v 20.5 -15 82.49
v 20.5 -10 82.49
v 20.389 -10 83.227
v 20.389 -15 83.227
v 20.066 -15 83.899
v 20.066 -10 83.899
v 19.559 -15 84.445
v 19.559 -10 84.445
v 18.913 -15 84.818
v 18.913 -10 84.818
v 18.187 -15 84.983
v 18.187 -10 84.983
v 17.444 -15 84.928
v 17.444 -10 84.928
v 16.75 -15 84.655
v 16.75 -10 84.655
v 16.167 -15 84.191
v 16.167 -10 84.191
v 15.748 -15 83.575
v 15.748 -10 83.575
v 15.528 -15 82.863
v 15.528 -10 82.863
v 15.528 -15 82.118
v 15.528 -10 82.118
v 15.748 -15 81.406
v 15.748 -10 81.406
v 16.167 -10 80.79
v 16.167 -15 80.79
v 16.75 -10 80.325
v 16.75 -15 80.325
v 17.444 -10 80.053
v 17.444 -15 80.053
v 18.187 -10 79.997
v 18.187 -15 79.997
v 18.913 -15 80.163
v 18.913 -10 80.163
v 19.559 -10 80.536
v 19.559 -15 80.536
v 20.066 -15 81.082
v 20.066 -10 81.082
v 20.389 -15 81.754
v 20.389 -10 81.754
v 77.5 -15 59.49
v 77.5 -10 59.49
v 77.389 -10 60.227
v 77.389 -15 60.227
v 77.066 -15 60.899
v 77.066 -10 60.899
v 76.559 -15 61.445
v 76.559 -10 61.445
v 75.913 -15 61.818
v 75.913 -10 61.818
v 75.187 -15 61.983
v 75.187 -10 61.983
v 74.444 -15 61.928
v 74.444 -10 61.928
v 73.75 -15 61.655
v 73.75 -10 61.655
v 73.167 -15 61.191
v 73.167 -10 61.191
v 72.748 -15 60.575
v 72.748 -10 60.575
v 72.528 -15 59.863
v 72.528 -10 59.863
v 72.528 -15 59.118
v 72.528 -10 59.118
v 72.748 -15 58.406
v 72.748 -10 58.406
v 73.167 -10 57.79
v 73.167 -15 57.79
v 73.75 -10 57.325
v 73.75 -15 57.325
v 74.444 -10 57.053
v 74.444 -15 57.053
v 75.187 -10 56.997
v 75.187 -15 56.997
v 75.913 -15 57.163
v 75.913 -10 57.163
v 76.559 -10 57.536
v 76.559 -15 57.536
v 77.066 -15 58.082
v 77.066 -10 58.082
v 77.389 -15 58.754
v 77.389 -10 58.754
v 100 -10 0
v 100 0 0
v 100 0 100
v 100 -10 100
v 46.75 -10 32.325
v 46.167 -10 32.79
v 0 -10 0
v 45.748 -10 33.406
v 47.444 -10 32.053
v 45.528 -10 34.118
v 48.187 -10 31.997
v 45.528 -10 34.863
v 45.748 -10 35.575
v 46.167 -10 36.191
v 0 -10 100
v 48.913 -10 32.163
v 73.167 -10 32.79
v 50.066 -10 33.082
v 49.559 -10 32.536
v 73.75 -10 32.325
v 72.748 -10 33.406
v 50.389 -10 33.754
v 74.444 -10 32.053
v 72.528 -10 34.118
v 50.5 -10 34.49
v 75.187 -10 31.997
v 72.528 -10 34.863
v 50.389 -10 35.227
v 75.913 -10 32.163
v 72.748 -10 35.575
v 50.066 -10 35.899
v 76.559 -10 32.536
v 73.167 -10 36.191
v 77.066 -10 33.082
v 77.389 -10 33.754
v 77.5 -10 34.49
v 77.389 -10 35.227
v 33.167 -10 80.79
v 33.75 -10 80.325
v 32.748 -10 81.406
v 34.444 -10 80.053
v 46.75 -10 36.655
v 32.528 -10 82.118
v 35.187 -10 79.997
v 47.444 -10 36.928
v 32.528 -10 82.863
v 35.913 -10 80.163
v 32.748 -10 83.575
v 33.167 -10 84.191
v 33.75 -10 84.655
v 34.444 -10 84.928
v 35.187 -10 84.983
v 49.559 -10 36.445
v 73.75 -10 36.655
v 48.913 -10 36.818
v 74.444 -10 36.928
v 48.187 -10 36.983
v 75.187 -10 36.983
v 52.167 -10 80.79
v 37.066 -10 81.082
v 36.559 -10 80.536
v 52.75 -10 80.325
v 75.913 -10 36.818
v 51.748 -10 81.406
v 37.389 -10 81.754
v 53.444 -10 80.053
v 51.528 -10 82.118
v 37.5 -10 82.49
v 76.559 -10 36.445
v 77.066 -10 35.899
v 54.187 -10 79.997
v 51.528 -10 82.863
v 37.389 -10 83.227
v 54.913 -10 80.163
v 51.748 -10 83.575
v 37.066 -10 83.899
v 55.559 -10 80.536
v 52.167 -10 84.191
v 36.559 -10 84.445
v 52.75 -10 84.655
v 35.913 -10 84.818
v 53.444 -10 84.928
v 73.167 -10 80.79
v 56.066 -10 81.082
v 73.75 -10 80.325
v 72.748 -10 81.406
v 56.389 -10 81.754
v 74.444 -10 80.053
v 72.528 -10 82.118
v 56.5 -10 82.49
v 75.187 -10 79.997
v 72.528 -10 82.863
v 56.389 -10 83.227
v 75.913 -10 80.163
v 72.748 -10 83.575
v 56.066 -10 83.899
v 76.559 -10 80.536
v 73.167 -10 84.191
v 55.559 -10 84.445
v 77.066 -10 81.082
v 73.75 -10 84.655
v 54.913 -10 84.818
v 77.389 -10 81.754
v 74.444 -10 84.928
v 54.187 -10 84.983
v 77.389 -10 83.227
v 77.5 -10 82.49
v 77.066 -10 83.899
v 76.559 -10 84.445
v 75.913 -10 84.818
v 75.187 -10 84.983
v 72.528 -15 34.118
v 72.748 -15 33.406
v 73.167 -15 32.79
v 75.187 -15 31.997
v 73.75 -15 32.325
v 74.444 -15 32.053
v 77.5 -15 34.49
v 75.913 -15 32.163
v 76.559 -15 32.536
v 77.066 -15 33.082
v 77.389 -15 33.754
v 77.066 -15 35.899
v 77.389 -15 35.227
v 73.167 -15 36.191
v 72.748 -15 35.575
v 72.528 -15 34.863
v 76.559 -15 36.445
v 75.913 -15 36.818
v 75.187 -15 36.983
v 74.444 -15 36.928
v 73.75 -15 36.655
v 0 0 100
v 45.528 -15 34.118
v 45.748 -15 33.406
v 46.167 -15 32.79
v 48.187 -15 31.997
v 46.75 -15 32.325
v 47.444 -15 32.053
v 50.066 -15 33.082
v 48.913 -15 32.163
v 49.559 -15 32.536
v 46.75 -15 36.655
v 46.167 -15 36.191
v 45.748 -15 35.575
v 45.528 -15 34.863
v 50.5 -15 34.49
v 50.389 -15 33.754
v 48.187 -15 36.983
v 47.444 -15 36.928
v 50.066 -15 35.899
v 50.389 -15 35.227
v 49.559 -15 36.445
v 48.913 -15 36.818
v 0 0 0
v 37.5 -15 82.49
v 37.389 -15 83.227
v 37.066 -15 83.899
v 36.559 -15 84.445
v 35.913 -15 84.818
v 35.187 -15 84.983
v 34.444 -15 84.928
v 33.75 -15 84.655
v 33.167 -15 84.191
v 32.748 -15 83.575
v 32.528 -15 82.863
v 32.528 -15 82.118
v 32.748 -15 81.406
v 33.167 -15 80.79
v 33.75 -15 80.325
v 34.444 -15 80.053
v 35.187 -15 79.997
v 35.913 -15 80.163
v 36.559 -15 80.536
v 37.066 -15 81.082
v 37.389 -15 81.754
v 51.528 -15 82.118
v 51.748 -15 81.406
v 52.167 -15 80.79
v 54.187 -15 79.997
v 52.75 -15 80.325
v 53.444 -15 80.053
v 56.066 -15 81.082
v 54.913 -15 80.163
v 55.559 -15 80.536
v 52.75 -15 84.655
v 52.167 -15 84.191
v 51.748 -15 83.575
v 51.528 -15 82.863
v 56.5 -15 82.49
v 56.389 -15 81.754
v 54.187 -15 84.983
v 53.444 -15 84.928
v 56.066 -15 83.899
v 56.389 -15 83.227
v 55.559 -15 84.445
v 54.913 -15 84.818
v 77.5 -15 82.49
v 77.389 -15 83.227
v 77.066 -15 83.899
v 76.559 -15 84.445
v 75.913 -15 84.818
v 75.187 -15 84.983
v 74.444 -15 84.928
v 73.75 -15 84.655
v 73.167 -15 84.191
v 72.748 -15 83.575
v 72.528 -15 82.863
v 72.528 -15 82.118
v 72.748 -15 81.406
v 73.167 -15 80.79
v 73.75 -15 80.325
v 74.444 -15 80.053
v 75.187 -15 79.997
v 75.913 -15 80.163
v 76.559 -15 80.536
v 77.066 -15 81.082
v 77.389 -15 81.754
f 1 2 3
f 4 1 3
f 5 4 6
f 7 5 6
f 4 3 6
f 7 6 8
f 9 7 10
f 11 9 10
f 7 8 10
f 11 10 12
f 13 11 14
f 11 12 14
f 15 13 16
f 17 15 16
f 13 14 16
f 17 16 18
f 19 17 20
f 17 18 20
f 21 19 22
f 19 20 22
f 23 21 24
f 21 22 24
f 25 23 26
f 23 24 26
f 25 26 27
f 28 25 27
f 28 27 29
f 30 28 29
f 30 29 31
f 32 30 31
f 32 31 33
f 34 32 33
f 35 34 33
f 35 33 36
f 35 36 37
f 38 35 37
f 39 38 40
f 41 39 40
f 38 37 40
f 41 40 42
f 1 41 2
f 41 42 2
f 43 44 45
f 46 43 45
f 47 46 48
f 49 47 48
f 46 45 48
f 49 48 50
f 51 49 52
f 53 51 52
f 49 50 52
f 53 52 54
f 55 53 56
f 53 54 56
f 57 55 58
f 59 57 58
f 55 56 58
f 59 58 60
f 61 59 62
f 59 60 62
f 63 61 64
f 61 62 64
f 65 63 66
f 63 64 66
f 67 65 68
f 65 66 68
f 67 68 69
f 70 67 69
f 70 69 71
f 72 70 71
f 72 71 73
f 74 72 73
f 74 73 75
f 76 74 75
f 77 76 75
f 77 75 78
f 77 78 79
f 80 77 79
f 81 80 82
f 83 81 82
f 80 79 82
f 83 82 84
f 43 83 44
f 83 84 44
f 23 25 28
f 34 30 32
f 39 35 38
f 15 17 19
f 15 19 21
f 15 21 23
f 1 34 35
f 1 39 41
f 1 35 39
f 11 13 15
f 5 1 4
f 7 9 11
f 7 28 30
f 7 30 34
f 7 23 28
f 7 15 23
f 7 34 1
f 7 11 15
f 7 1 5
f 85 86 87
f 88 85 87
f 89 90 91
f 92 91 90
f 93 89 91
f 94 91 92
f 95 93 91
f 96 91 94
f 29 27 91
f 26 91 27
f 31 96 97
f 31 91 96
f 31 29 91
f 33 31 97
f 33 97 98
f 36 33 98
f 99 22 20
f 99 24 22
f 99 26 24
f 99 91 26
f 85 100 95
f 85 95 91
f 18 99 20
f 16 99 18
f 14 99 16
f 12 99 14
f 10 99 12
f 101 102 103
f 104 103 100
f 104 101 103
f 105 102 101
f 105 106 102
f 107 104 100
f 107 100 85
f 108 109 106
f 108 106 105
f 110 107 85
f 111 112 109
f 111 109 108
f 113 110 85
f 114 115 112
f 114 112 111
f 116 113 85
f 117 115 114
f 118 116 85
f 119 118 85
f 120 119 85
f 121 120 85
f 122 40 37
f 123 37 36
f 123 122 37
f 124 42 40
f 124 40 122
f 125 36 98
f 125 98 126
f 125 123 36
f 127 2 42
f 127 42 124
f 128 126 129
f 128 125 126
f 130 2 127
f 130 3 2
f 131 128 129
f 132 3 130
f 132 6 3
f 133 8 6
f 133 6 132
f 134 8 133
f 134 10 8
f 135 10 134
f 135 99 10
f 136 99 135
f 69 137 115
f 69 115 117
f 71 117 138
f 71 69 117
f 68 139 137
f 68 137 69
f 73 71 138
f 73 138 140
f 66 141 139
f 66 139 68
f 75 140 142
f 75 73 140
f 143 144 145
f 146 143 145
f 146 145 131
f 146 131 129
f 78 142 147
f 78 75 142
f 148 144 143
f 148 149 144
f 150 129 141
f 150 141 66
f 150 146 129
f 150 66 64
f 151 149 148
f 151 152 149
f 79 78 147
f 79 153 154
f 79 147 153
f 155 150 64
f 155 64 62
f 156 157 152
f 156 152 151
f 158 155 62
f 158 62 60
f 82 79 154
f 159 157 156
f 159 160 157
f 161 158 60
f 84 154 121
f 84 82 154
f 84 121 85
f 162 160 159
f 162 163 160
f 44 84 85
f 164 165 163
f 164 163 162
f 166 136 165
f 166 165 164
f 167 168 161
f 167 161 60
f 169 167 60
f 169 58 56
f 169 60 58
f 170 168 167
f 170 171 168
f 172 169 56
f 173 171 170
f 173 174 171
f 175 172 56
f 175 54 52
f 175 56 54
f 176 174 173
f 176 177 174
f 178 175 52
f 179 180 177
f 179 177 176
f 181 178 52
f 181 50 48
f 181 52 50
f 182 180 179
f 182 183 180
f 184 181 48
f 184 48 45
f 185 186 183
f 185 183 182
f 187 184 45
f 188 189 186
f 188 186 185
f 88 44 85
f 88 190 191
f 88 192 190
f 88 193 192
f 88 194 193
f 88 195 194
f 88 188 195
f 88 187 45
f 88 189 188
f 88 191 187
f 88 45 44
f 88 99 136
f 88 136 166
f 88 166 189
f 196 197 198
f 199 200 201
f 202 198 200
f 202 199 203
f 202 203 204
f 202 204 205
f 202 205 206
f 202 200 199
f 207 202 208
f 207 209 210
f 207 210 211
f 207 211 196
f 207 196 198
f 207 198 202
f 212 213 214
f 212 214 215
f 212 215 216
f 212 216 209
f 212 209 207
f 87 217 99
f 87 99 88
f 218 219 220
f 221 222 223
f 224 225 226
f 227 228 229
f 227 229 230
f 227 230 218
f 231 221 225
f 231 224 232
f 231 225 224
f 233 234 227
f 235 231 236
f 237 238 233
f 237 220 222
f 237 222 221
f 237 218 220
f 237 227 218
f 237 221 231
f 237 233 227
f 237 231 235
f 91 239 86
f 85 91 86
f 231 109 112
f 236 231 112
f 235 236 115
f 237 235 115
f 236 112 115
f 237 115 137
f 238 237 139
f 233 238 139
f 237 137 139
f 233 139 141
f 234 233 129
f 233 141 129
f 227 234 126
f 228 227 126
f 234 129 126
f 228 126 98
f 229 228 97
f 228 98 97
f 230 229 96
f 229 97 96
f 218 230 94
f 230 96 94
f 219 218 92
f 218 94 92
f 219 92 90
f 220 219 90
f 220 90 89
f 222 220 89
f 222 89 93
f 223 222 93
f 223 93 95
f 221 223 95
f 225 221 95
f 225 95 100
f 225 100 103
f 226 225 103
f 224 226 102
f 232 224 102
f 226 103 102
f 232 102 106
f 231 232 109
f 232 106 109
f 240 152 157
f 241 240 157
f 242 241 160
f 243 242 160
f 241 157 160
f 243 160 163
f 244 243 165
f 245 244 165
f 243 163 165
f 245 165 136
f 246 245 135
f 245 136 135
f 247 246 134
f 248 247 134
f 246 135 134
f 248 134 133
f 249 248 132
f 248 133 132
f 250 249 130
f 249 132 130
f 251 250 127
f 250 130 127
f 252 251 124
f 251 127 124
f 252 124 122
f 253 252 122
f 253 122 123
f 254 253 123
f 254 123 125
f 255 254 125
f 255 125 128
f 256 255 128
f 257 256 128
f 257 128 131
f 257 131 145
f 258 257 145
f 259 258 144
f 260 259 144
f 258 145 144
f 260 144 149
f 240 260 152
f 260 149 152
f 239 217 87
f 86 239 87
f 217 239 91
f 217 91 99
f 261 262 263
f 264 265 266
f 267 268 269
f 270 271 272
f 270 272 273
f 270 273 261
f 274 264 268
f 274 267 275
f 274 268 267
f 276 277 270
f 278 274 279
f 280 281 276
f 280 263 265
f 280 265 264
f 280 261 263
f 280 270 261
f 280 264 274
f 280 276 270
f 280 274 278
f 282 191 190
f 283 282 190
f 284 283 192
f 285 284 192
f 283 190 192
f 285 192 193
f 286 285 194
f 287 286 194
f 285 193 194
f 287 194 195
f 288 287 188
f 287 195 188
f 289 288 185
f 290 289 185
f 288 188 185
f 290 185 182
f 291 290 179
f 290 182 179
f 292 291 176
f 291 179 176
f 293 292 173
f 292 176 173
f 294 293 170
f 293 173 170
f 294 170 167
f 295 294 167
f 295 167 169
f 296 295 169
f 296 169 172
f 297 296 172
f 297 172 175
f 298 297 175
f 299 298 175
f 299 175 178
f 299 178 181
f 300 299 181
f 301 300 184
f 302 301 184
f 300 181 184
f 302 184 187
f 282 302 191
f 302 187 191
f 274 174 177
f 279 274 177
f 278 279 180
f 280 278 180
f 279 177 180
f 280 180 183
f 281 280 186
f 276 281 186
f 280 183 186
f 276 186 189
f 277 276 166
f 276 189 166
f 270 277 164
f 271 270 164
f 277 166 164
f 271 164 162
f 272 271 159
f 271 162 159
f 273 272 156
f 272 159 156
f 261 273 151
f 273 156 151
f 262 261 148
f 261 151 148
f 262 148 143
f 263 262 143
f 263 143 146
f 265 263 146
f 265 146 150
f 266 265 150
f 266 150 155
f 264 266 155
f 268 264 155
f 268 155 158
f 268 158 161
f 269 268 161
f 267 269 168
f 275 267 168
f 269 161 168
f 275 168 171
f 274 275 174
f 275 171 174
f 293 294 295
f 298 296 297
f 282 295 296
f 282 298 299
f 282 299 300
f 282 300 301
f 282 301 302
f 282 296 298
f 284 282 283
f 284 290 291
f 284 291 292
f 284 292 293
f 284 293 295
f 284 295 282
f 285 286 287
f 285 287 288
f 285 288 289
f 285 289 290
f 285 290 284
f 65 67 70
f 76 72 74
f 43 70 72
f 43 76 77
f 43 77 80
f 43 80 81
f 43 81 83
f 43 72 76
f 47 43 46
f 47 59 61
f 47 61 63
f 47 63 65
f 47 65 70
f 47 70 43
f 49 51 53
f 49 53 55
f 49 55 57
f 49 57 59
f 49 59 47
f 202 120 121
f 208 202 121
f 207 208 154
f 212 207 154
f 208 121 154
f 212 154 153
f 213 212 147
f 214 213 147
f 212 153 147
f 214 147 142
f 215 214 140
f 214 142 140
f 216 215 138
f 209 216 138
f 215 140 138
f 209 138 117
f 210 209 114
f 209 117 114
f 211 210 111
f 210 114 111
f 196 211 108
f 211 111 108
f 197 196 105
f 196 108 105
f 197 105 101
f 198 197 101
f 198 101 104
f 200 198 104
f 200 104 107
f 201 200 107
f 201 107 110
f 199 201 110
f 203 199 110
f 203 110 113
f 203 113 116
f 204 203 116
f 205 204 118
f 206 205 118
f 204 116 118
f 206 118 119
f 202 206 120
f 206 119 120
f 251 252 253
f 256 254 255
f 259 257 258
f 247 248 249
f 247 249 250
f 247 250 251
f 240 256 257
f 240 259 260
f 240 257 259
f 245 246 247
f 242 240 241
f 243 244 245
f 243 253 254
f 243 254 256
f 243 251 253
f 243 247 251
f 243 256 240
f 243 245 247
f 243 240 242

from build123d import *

# Parameters (mm, degrees)
F0_W     = 100
F0_H     = 100
F0_R     = 2.5
F1_DEPTH = 10
F2_R     = 2.5
F3_DEPTH = 5


with BuildPart() as f1:
    # F0 (on Front) → F1 (new body)
    with BuildSketch(Plane.XZ):
        with Locations((50, 50)):
            Rectangle(F0_W, F0_H)
        with Locations((12, 81.869952)):
            Circle(F0_R, mode=Mode.SUBTRACT)
        with Locations((29, 81.869952)):
            Circle(F0_R, mode=Mode.SUBTRACT)
        with Locations((48, 81.869952)):
            Circle(F0_R, mode=Mode.SUBTRACT)
        with Locations((69, 81.869952)):
            Circle(F0_R, mode=Mode.SUBTRACT)
        with Locations((12, 81.869952)):
            Circle(F0_R)
        with Locations((29, 81.869952)):
            Circle(F0_R)
        with Locations((48, 81.869952)):
            Circle(F0_R)
        with Locations((69, 81.869952)):
            Circle(F0_R)
    extrude(amount=F1_DEPTH)

    # F2 (on face) → F3 (join)
    with BuildSketch(Plane.XZ.offset(10)):
        with Locations((18, 82.490392)):
            Circle(F2_R)
        with Locations((35, 82.490392)):
            Circle(F2_R)
        with Locations((54, 82.490392)):
            Circle(F2_R)
        with Locations((75, 82.490392)):
            Circle(F2_R)
        with Locations((75, 59.490392)):
            Circle(F2_R)
        with Locations((75, 34.490392)):
            Circle(F2_R)
        with Locations((48, 34.490392)):
            Circle(F2_R)
    extrude(amount=F3_DEPTH)


solid = f1.part
